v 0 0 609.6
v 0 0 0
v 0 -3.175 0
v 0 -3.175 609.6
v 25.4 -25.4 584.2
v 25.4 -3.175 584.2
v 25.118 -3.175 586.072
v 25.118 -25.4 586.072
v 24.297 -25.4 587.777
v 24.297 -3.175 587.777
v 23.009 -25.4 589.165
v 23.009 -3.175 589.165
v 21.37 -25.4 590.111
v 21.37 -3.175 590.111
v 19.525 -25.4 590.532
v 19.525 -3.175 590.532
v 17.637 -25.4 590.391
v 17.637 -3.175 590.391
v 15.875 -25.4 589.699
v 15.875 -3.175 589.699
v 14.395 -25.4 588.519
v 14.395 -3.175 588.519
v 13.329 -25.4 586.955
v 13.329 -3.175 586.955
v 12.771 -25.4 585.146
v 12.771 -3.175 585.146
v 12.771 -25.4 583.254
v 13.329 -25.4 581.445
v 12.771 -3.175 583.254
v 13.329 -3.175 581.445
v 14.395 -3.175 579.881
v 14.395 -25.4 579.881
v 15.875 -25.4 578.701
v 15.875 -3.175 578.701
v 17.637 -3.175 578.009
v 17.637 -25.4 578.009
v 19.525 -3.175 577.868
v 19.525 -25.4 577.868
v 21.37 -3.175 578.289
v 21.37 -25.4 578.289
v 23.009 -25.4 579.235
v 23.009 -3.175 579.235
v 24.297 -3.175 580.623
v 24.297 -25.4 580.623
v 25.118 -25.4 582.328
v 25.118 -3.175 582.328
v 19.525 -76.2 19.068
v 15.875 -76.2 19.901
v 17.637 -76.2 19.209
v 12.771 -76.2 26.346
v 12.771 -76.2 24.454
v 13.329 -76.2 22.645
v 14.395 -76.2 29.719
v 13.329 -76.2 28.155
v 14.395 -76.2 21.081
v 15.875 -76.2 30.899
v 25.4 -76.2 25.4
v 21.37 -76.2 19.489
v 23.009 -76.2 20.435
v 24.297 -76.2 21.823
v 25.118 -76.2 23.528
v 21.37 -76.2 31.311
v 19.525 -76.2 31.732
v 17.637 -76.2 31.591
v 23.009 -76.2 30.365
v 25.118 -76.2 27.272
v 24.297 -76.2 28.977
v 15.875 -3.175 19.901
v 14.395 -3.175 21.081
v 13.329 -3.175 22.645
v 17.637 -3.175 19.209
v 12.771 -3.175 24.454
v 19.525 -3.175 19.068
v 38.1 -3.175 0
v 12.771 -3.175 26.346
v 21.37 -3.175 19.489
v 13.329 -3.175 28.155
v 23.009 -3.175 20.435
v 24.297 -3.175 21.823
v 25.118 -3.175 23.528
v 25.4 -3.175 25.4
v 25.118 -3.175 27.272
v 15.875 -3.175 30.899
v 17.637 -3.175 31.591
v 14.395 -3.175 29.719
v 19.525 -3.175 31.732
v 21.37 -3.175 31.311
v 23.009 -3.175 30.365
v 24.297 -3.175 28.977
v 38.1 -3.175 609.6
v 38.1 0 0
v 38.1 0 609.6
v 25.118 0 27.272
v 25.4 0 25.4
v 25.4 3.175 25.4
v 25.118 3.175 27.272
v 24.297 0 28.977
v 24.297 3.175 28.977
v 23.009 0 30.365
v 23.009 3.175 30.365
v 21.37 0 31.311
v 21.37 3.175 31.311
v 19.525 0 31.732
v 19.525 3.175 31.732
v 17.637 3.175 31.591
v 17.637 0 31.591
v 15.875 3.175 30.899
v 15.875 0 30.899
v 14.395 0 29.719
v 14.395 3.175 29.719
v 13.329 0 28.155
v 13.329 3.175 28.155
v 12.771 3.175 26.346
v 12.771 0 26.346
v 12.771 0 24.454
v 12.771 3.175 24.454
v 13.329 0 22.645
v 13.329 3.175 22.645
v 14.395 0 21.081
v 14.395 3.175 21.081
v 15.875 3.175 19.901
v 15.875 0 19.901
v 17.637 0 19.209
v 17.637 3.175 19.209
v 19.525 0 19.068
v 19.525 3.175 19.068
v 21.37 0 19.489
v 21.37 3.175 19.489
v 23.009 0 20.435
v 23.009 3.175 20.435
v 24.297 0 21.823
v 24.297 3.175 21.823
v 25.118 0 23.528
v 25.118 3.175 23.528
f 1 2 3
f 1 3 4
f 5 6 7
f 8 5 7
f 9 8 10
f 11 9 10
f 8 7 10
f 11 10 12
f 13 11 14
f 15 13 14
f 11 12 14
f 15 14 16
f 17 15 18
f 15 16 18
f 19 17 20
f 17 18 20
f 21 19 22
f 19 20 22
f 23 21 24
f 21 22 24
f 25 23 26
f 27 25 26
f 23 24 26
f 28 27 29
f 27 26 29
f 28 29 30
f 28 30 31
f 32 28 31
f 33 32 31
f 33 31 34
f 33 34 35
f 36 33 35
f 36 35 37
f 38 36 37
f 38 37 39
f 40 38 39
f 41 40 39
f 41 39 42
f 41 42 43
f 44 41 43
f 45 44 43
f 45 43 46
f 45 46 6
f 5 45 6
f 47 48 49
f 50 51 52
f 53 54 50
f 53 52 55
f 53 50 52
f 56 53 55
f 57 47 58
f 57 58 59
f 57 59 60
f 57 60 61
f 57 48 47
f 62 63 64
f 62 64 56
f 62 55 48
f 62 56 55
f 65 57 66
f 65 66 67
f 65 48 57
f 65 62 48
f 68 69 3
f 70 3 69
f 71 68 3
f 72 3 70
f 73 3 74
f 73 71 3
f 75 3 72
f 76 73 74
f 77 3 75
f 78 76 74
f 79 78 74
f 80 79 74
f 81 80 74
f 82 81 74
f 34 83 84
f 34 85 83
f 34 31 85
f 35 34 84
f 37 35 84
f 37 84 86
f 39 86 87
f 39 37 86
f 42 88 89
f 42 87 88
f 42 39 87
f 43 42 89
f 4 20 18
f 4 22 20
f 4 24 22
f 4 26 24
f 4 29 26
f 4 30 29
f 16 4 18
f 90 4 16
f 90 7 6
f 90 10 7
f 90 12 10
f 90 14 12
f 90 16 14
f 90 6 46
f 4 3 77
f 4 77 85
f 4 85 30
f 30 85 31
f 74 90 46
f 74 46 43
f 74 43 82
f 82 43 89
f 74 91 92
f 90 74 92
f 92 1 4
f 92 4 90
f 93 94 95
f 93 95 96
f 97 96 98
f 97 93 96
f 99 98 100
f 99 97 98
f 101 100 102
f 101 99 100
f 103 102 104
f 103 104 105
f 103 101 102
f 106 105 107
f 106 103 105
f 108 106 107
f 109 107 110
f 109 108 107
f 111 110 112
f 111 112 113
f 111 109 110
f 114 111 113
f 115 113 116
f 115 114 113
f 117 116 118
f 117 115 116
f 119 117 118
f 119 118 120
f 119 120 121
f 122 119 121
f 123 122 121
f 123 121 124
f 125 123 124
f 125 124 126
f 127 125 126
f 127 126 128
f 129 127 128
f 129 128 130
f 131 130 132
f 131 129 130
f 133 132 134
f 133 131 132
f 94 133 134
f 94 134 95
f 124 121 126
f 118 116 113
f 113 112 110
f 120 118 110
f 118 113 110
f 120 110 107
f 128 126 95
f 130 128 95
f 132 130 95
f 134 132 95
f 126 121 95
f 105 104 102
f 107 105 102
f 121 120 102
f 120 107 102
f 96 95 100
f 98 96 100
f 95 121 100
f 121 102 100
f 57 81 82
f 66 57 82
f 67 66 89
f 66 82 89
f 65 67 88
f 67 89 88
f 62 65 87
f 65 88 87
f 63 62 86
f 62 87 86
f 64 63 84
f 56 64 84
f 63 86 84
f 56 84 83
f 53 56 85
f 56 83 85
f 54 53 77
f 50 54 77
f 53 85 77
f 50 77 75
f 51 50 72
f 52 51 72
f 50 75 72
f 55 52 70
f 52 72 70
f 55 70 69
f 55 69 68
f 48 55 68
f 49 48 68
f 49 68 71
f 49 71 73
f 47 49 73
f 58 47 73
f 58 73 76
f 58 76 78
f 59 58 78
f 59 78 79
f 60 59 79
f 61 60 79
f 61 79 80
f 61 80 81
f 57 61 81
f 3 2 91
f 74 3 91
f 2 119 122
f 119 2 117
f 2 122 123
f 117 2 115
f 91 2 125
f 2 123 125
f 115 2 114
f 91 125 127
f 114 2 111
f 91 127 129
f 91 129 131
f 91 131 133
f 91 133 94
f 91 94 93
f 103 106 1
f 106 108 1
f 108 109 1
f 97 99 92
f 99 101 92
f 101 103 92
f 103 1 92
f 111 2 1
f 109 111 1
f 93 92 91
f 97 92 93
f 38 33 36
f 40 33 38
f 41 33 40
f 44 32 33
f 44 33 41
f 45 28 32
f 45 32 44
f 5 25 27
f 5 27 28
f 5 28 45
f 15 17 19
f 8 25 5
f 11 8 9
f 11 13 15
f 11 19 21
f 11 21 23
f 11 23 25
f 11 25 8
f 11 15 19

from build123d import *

# Parameters (mm, degrees)
F0_W          = 38.1
F0_H          = 609.6
F0_R          = 6.35
F1_DEPTH      = 3.175
F2_DEPTH      = 76.2
F2_DEPTH_BACK = 3.175
F3_DEPTH      = 25.4


with BuildPart() as f1:
    # F0 (on Front) → F1 (new body)
    with BuildSketch(Plane.XZ):
        with Locations((19.05, 304.8)):
            Rectangle(F0_W, F0_H)
        with Locations((19.05, 25.4)):
            Circle(F0_R, mode=Mode.SUBTRACT)
        with Locations((19.05, 584.2)):
            Circle(F0_R, mode=Mode.SUBTRACT)
    extrude(amount=F1_DEPTH)

    # F0 (on Front) → F2 (join, two sides)
    with BuildSketch(Plane.XZ) as f2_sk:
        with Locations((19.05, 25.4)):
            Circle(F0_R)
    extrude(amount=F2_DEPTH)
    extrude(f2_sk.sketch, amount=-F2_DEPTH_BACK)

    # F0 (on Front) → F3 (join)
    with BuildSketch(Plane.XZ):
        with Locations((19.05, 584.2)):
            Circle(F0_R)
    extrude(amount=F3_DEPTH)


solid = f1.part
